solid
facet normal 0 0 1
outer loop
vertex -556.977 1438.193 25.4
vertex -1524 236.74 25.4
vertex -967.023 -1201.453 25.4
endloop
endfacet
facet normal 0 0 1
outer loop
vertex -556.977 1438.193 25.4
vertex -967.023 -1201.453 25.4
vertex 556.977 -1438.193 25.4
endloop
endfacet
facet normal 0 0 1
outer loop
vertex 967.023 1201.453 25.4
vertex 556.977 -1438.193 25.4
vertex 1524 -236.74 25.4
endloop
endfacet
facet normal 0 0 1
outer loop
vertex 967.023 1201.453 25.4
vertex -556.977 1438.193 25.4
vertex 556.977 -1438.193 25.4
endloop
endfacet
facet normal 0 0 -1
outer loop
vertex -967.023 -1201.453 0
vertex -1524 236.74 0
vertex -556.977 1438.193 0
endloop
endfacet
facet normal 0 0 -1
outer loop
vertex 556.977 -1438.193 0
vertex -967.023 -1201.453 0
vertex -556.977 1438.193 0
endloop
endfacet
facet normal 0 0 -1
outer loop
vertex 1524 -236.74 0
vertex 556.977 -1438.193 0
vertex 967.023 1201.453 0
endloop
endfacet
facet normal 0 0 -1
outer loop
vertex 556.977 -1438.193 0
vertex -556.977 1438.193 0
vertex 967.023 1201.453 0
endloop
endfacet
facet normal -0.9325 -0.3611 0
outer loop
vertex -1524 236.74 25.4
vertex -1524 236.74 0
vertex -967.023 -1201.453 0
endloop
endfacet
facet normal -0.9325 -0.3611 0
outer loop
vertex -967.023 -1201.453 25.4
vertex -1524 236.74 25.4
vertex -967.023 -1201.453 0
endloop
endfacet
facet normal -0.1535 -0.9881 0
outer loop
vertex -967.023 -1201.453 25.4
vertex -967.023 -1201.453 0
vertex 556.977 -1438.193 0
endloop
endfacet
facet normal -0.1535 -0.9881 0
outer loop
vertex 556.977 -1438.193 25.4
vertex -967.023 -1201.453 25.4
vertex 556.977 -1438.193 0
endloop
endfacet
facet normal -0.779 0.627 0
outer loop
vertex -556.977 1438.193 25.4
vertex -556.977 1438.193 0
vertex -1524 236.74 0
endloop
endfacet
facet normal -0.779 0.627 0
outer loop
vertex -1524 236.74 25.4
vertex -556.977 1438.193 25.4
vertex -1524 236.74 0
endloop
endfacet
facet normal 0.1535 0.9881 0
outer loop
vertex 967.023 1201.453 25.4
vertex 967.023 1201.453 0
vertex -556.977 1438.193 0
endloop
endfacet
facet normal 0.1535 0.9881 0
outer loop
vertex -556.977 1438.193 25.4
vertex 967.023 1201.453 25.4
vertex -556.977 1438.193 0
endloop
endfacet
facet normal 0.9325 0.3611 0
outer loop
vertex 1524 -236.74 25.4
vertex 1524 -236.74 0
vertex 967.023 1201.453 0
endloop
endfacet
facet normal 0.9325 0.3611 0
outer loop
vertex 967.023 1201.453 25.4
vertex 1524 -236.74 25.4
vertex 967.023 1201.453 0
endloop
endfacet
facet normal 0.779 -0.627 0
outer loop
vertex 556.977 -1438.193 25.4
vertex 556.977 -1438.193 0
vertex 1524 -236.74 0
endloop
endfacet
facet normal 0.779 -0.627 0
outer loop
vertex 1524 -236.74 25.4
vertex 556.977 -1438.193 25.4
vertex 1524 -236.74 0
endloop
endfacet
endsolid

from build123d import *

# Parameters (mm, degrees)
F1_DEPTH = 25.4


with BuildPart() as f1:
    # F0 (on Top) → F1 (new body)
    with BuildSketch(Plane.XY):
        Polygon((1524, -236.740068), (967.022913, 1201.452681), (-556.977087, 1438.192749), align=None)
        Polygon((556.977087, -1438.192749), (1524, -236.740068), (-556.977087, 1438.192749), (-1524, 236.740068), (-967.022913, -1201.452681), align=None)
    extrude(amount=F1_DEPTH)


solid = f1.part
